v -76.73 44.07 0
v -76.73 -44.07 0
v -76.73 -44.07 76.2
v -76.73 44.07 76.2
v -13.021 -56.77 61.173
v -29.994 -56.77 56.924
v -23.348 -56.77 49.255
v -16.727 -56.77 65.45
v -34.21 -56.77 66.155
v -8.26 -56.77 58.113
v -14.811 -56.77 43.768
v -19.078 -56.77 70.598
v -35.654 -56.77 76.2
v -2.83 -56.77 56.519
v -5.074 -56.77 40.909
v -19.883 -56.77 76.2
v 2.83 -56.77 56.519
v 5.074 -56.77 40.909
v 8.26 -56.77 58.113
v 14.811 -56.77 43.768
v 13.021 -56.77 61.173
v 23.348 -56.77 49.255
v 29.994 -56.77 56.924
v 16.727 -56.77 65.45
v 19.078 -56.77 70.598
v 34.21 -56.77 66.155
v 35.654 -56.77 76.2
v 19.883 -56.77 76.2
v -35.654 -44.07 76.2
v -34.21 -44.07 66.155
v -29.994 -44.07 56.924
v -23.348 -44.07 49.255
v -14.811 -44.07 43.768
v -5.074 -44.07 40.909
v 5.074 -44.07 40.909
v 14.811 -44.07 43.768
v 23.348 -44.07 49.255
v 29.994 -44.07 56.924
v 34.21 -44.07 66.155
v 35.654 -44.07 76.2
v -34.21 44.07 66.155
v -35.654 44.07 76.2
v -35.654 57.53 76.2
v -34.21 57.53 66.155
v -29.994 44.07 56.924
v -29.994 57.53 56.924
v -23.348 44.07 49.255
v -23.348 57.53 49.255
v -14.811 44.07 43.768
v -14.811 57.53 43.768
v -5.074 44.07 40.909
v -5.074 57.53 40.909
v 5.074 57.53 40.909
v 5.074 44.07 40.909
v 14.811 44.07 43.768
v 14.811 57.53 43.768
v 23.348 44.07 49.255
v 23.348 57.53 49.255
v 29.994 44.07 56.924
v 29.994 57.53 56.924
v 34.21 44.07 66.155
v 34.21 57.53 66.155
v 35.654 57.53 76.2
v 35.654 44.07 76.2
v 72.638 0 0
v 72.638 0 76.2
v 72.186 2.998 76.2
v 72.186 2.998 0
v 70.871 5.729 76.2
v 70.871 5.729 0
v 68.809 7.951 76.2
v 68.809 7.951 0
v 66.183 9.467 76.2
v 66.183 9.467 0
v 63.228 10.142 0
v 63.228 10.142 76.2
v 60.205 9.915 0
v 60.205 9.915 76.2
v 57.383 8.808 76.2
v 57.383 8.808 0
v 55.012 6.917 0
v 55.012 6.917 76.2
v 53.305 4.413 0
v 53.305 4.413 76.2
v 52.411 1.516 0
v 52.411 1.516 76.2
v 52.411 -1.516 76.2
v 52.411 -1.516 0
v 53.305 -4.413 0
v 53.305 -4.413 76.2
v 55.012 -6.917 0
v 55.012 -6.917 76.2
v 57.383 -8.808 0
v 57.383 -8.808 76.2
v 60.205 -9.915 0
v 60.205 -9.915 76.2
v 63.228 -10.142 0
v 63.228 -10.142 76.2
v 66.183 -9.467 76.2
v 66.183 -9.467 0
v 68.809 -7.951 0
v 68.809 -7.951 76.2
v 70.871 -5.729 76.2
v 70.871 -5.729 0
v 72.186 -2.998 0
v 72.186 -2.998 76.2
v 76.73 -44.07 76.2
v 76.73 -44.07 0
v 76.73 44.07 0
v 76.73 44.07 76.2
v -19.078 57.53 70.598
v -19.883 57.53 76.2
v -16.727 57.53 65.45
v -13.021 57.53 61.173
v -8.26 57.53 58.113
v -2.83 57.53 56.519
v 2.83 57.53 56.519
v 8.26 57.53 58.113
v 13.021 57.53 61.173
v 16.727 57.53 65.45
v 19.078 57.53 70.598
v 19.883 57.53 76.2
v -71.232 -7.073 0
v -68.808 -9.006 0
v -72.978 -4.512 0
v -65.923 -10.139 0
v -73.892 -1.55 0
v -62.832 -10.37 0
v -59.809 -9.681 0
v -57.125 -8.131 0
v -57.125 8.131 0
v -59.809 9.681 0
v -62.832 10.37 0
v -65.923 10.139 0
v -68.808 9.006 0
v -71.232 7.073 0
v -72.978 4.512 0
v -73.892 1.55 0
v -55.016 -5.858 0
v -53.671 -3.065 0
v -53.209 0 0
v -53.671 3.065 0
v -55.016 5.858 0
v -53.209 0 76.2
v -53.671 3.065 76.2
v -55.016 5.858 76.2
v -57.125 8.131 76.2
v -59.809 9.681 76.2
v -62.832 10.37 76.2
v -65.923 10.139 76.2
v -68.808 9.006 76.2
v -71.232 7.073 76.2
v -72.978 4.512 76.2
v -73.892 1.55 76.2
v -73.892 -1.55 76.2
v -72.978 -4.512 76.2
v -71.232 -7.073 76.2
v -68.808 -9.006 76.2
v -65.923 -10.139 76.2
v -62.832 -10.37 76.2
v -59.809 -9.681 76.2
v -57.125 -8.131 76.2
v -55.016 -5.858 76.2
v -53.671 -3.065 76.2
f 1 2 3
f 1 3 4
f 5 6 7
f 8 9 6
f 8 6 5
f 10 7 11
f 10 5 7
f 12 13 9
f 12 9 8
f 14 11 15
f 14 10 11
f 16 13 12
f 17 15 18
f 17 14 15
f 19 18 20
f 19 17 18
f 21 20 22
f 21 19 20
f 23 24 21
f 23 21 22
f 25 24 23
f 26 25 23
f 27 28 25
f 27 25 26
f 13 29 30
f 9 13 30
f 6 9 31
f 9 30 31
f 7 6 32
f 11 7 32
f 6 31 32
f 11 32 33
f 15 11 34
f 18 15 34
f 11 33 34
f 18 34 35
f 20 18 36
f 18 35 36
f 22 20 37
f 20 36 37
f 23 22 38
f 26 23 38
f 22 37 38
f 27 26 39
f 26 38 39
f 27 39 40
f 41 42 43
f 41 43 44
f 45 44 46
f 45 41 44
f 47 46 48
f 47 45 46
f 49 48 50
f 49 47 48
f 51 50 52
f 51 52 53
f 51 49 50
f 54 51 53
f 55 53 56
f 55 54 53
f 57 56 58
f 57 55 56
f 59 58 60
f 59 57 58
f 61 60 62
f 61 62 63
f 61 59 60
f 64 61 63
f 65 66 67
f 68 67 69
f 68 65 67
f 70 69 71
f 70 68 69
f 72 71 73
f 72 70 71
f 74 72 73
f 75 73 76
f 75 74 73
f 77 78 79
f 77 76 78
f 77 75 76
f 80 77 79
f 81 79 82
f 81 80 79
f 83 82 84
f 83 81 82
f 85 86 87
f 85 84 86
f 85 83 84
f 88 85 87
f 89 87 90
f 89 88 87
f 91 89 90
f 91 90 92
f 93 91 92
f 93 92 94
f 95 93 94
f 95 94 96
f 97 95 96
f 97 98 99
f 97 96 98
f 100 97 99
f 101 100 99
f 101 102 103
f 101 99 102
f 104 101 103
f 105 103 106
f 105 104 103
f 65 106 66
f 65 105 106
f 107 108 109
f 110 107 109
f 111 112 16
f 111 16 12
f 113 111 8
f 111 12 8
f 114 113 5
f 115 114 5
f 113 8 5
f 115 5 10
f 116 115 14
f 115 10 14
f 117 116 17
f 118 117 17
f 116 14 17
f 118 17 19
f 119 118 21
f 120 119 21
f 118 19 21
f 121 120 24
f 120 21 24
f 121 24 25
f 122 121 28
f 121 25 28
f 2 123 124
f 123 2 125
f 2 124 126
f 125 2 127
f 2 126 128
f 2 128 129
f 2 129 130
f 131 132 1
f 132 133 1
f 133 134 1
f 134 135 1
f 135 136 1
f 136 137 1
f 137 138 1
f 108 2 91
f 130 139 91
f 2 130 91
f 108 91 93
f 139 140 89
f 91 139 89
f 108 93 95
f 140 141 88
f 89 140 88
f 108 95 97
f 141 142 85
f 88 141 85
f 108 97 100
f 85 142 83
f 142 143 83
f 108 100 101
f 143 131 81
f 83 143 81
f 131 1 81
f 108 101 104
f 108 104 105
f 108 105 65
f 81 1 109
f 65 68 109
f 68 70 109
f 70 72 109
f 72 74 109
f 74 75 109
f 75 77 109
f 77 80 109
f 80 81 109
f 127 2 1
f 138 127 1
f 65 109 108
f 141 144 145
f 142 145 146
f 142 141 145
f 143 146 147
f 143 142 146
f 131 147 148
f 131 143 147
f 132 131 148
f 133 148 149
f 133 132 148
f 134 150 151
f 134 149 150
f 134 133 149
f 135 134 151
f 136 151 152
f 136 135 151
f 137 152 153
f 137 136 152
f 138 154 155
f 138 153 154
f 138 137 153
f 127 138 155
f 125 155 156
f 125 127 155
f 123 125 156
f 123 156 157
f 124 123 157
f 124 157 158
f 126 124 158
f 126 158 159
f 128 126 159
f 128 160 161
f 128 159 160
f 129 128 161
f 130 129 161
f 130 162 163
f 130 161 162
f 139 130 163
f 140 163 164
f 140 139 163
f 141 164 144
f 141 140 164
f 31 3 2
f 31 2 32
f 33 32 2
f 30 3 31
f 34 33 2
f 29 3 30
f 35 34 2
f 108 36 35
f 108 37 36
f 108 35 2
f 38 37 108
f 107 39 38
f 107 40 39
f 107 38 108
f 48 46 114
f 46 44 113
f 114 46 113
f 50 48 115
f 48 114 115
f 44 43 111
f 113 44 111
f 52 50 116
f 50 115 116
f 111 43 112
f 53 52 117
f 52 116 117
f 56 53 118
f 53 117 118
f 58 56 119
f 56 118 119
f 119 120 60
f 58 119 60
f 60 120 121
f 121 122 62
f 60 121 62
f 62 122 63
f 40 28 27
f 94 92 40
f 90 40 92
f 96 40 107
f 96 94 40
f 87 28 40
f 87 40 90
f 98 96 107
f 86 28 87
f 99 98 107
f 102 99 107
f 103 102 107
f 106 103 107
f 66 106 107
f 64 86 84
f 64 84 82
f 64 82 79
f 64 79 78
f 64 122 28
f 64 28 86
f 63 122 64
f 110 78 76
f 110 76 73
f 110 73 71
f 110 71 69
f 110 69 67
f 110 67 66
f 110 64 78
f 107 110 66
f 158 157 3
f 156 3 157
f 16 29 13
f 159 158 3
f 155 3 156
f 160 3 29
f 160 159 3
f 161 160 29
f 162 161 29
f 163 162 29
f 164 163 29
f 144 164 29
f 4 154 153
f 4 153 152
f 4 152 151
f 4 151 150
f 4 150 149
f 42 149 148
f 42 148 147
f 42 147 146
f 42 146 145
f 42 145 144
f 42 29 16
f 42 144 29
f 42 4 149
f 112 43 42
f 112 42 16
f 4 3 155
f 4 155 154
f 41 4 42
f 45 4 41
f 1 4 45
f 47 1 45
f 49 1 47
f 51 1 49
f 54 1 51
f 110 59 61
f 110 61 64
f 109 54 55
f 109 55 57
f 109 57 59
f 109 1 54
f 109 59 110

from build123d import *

# Parameters (mm, degrees)
F0_W     = 153.4594595432
F0_H     = 88.1393551826
F2_DEPTH = 76.2
F1_R     = 10.1701349395
F1_R_2   = 10.3995540655
F3_DEPTH = 76.201
F5_DEPTH = 101.6
F7_DEPTH = 12.7
F9_DEPTH = 114.301


with BuildPart() as f2:
    # F0 (on Top) → F2 (new body)
    with BuildSketch(Plane.XY):
        Rectangle(F0_W, F0_H)
    extrude(amount=F2_DEPTH)

    # F1 (on face) → F3 (cut, through all)
    with BuildSketch(Plane.XY):
        with Locations((62.4677017331, 0)):
            Circle(F1_R)
        with Locations((-63.608661294, 0)):
            Circle(F1_R_2)
    extrude(amount=F3_DEPTH, mode=Mode.SUBTRACT)

    # F4 (on face) → F5 (join)
    with BuildSketch(Plane.XZ.offset(44.0696775913)):
        with BuildLine():
            ThreePointArc((-35.6539782969, 76.2), (0, 40.5460217031), (35.6539782969, 76.2))
            Line((35.6539782969, 76.2), (-35.6539782969, 76.2))
        make_face()
    extrude(amount=-F5_DEPTH)

    # F6 (on face) → F7 (join)
    with BuildSketch(Plane.XZ.offset(44.0696775913)):
        with BuildLine():
            ThreePointArc((-35.6539782969, 76.2), (0, 40.5460217031), (35.6539782969, 76.2))
            Line((35.6539782969, 76.2), (-35.6539782969, 76.2))
        make_face()
    extrude(amount=F7_DEPTH)

    # F8 (on face) → F9 (cut, through all)
    with BuildSketch(Plane.XZ.offset(56.7696775913)):
        with BuildLine():
            ThreePointArc((-19.8833374867, 76.2), (0, 56.3166625133), (19.8833374867, 76.2))
            Line((19.8833374867, 76.2), (-19.8833374867, 76.2))
        make_face()
        with BuildLine():
            Line((-19.8833374867, 76.2), (19.8833374867, 76.2))
            ThreePointArc((19.8833374867, 76.2), (0, 96.0833374867), (-19.8833374867, 76.2))
        make_face()
    extrude(amount=-F9_DEPTH, mode=Mode.SUBTRACT)


solid = f2.part
